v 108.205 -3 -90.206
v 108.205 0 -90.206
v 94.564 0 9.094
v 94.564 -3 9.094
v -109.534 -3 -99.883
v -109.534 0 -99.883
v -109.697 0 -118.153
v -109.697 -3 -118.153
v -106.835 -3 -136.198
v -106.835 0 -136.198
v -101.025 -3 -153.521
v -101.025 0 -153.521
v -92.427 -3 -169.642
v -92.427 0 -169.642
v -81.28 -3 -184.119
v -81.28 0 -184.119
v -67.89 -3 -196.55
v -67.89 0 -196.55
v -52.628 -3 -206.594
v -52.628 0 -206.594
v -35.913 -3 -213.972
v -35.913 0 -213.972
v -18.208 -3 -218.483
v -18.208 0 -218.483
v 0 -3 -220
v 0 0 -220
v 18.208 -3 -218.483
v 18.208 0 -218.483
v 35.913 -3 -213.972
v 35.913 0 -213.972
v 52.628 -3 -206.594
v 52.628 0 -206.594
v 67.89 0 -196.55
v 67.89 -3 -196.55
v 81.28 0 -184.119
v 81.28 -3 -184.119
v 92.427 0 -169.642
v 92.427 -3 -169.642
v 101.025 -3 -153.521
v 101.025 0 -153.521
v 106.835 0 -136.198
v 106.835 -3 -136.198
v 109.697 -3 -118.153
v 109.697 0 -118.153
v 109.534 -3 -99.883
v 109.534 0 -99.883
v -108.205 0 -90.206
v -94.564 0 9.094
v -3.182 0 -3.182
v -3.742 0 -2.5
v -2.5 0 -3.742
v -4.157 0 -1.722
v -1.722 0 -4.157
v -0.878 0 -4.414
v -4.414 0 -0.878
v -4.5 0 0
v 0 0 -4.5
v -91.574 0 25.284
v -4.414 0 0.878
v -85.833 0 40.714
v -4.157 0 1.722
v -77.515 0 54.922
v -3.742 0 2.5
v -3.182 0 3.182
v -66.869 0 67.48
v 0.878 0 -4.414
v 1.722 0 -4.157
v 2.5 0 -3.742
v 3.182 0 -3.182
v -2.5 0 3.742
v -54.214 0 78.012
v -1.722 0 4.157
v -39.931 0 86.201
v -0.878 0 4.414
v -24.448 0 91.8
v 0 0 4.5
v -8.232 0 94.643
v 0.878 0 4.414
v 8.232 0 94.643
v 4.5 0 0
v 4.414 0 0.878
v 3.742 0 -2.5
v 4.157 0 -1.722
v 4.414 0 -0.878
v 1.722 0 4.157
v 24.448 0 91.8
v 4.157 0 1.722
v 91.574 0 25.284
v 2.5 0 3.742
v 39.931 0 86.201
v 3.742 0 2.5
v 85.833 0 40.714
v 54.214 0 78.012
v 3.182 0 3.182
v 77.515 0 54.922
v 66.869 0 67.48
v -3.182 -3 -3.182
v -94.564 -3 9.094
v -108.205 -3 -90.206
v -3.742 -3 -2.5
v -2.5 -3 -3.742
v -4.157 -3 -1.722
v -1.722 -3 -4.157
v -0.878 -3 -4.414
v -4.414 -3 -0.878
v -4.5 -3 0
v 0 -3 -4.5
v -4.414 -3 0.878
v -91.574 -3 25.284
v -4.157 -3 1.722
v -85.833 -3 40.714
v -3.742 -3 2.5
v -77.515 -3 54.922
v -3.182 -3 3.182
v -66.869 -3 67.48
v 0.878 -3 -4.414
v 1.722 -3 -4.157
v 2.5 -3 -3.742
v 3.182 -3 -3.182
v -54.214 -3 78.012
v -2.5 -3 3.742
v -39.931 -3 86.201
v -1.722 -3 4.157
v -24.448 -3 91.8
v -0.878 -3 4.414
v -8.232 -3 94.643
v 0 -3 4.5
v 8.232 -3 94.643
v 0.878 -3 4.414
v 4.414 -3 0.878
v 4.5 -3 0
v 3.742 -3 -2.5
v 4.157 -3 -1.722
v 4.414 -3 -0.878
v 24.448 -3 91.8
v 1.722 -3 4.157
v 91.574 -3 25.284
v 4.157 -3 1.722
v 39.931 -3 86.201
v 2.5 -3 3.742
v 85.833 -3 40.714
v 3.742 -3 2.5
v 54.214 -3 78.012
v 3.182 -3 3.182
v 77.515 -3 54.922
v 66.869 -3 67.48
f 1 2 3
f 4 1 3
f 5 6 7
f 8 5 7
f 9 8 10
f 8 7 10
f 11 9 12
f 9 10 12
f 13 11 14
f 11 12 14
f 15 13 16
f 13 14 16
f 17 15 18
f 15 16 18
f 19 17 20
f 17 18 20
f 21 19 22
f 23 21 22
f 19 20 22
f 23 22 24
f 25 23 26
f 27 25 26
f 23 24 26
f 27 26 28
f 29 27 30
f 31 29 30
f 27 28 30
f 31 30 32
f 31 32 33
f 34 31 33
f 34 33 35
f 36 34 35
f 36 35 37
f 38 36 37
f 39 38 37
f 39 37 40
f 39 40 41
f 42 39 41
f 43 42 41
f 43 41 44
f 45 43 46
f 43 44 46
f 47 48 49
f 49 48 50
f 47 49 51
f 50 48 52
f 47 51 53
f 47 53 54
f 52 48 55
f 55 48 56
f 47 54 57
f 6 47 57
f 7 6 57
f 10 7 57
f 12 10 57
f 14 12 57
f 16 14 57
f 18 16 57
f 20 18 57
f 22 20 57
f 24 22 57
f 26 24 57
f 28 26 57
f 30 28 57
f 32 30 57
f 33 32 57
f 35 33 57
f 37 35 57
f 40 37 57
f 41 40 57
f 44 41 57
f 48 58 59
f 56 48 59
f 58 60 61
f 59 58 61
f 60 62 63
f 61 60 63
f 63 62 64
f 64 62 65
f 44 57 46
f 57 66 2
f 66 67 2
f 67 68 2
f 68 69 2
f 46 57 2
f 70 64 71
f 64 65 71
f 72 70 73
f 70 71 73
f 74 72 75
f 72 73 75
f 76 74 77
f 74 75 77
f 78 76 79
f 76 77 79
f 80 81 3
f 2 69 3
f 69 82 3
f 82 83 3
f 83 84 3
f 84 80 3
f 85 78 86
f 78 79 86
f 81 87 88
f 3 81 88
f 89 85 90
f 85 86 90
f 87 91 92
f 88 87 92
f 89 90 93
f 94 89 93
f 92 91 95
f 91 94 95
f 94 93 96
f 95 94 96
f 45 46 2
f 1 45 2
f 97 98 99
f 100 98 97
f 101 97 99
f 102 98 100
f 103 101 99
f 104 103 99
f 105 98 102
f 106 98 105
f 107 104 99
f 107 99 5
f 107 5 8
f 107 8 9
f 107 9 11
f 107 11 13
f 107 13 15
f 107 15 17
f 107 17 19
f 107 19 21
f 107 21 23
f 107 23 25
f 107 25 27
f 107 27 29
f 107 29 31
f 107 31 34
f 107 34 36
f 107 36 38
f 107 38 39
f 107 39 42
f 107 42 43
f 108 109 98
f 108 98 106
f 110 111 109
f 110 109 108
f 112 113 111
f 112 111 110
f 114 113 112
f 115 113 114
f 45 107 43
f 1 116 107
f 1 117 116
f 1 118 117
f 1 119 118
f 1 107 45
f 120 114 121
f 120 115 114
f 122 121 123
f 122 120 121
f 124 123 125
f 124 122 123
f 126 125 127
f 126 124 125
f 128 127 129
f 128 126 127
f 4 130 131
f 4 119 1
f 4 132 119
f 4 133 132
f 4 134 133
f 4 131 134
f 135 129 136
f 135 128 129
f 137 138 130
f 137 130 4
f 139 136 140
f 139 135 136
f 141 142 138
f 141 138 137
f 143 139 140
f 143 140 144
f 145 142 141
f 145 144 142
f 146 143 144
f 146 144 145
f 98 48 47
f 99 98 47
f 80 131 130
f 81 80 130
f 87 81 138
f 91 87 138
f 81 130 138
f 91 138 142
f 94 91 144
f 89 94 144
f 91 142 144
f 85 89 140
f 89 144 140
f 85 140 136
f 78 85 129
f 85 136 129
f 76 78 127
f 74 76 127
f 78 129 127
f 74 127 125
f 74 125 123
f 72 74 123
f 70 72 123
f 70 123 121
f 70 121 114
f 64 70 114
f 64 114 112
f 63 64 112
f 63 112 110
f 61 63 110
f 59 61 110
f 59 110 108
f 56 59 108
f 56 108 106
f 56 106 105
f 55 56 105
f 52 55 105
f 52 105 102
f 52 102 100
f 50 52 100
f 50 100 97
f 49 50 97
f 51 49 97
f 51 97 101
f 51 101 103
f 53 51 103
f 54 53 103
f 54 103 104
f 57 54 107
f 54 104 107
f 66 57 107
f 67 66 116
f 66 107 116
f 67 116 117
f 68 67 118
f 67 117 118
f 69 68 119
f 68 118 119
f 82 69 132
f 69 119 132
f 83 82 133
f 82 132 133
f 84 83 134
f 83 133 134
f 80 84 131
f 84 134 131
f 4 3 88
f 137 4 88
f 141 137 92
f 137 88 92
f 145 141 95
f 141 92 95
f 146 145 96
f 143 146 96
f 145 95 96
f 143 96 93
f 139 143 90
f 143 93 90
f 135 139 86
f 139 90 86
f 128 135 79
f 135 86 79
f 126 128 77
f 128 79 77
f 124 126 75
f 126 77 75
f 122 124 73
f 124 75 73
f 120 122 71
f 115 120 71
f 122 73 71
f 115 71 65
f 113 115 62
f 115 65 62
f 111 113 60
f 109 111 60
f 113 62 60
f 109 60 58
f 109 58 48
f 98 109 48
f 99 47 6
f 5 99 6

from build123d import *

# Parameters (mm, degrees)
F1_DEPTH = 3
F2_R     = 4.5
F3_DEPTH = 3.001


with BuildPart() as f1:
    # F0 (on Front) → F1 (new body)
    with BuildSketch(Plane.XZ):
        with BuildLine():
            Line((108.20451, -90.206463), (94.563775, 9.093536))
            ThreePointArc((94.563775, 9.093536), (0, 95), (-94.563775, 9.093536))
            Line((-94.563775, 9.093536), (-108.20451, -90.206463))
            Line((-108.20451, -90.206463), (-109.533774, -99.883063))
            ThreePointArc((-109.533774, -99.883063), (0, -220), (109.533774, -99.883063))
            Line((109.533774, -99.883063), (108.20451, -90.206463))
        make_face()
    extrude(amount=F1_DEPTH)

    # F2 (on face) → F3 (cut, through all)
    with BuildSketch(Plane.XZ.offset(3)):
        Circle(F2_R)
    extrude(amount=-F3_DEPTH, mode=Mode.SUBTRACT)


solid = f1.part
